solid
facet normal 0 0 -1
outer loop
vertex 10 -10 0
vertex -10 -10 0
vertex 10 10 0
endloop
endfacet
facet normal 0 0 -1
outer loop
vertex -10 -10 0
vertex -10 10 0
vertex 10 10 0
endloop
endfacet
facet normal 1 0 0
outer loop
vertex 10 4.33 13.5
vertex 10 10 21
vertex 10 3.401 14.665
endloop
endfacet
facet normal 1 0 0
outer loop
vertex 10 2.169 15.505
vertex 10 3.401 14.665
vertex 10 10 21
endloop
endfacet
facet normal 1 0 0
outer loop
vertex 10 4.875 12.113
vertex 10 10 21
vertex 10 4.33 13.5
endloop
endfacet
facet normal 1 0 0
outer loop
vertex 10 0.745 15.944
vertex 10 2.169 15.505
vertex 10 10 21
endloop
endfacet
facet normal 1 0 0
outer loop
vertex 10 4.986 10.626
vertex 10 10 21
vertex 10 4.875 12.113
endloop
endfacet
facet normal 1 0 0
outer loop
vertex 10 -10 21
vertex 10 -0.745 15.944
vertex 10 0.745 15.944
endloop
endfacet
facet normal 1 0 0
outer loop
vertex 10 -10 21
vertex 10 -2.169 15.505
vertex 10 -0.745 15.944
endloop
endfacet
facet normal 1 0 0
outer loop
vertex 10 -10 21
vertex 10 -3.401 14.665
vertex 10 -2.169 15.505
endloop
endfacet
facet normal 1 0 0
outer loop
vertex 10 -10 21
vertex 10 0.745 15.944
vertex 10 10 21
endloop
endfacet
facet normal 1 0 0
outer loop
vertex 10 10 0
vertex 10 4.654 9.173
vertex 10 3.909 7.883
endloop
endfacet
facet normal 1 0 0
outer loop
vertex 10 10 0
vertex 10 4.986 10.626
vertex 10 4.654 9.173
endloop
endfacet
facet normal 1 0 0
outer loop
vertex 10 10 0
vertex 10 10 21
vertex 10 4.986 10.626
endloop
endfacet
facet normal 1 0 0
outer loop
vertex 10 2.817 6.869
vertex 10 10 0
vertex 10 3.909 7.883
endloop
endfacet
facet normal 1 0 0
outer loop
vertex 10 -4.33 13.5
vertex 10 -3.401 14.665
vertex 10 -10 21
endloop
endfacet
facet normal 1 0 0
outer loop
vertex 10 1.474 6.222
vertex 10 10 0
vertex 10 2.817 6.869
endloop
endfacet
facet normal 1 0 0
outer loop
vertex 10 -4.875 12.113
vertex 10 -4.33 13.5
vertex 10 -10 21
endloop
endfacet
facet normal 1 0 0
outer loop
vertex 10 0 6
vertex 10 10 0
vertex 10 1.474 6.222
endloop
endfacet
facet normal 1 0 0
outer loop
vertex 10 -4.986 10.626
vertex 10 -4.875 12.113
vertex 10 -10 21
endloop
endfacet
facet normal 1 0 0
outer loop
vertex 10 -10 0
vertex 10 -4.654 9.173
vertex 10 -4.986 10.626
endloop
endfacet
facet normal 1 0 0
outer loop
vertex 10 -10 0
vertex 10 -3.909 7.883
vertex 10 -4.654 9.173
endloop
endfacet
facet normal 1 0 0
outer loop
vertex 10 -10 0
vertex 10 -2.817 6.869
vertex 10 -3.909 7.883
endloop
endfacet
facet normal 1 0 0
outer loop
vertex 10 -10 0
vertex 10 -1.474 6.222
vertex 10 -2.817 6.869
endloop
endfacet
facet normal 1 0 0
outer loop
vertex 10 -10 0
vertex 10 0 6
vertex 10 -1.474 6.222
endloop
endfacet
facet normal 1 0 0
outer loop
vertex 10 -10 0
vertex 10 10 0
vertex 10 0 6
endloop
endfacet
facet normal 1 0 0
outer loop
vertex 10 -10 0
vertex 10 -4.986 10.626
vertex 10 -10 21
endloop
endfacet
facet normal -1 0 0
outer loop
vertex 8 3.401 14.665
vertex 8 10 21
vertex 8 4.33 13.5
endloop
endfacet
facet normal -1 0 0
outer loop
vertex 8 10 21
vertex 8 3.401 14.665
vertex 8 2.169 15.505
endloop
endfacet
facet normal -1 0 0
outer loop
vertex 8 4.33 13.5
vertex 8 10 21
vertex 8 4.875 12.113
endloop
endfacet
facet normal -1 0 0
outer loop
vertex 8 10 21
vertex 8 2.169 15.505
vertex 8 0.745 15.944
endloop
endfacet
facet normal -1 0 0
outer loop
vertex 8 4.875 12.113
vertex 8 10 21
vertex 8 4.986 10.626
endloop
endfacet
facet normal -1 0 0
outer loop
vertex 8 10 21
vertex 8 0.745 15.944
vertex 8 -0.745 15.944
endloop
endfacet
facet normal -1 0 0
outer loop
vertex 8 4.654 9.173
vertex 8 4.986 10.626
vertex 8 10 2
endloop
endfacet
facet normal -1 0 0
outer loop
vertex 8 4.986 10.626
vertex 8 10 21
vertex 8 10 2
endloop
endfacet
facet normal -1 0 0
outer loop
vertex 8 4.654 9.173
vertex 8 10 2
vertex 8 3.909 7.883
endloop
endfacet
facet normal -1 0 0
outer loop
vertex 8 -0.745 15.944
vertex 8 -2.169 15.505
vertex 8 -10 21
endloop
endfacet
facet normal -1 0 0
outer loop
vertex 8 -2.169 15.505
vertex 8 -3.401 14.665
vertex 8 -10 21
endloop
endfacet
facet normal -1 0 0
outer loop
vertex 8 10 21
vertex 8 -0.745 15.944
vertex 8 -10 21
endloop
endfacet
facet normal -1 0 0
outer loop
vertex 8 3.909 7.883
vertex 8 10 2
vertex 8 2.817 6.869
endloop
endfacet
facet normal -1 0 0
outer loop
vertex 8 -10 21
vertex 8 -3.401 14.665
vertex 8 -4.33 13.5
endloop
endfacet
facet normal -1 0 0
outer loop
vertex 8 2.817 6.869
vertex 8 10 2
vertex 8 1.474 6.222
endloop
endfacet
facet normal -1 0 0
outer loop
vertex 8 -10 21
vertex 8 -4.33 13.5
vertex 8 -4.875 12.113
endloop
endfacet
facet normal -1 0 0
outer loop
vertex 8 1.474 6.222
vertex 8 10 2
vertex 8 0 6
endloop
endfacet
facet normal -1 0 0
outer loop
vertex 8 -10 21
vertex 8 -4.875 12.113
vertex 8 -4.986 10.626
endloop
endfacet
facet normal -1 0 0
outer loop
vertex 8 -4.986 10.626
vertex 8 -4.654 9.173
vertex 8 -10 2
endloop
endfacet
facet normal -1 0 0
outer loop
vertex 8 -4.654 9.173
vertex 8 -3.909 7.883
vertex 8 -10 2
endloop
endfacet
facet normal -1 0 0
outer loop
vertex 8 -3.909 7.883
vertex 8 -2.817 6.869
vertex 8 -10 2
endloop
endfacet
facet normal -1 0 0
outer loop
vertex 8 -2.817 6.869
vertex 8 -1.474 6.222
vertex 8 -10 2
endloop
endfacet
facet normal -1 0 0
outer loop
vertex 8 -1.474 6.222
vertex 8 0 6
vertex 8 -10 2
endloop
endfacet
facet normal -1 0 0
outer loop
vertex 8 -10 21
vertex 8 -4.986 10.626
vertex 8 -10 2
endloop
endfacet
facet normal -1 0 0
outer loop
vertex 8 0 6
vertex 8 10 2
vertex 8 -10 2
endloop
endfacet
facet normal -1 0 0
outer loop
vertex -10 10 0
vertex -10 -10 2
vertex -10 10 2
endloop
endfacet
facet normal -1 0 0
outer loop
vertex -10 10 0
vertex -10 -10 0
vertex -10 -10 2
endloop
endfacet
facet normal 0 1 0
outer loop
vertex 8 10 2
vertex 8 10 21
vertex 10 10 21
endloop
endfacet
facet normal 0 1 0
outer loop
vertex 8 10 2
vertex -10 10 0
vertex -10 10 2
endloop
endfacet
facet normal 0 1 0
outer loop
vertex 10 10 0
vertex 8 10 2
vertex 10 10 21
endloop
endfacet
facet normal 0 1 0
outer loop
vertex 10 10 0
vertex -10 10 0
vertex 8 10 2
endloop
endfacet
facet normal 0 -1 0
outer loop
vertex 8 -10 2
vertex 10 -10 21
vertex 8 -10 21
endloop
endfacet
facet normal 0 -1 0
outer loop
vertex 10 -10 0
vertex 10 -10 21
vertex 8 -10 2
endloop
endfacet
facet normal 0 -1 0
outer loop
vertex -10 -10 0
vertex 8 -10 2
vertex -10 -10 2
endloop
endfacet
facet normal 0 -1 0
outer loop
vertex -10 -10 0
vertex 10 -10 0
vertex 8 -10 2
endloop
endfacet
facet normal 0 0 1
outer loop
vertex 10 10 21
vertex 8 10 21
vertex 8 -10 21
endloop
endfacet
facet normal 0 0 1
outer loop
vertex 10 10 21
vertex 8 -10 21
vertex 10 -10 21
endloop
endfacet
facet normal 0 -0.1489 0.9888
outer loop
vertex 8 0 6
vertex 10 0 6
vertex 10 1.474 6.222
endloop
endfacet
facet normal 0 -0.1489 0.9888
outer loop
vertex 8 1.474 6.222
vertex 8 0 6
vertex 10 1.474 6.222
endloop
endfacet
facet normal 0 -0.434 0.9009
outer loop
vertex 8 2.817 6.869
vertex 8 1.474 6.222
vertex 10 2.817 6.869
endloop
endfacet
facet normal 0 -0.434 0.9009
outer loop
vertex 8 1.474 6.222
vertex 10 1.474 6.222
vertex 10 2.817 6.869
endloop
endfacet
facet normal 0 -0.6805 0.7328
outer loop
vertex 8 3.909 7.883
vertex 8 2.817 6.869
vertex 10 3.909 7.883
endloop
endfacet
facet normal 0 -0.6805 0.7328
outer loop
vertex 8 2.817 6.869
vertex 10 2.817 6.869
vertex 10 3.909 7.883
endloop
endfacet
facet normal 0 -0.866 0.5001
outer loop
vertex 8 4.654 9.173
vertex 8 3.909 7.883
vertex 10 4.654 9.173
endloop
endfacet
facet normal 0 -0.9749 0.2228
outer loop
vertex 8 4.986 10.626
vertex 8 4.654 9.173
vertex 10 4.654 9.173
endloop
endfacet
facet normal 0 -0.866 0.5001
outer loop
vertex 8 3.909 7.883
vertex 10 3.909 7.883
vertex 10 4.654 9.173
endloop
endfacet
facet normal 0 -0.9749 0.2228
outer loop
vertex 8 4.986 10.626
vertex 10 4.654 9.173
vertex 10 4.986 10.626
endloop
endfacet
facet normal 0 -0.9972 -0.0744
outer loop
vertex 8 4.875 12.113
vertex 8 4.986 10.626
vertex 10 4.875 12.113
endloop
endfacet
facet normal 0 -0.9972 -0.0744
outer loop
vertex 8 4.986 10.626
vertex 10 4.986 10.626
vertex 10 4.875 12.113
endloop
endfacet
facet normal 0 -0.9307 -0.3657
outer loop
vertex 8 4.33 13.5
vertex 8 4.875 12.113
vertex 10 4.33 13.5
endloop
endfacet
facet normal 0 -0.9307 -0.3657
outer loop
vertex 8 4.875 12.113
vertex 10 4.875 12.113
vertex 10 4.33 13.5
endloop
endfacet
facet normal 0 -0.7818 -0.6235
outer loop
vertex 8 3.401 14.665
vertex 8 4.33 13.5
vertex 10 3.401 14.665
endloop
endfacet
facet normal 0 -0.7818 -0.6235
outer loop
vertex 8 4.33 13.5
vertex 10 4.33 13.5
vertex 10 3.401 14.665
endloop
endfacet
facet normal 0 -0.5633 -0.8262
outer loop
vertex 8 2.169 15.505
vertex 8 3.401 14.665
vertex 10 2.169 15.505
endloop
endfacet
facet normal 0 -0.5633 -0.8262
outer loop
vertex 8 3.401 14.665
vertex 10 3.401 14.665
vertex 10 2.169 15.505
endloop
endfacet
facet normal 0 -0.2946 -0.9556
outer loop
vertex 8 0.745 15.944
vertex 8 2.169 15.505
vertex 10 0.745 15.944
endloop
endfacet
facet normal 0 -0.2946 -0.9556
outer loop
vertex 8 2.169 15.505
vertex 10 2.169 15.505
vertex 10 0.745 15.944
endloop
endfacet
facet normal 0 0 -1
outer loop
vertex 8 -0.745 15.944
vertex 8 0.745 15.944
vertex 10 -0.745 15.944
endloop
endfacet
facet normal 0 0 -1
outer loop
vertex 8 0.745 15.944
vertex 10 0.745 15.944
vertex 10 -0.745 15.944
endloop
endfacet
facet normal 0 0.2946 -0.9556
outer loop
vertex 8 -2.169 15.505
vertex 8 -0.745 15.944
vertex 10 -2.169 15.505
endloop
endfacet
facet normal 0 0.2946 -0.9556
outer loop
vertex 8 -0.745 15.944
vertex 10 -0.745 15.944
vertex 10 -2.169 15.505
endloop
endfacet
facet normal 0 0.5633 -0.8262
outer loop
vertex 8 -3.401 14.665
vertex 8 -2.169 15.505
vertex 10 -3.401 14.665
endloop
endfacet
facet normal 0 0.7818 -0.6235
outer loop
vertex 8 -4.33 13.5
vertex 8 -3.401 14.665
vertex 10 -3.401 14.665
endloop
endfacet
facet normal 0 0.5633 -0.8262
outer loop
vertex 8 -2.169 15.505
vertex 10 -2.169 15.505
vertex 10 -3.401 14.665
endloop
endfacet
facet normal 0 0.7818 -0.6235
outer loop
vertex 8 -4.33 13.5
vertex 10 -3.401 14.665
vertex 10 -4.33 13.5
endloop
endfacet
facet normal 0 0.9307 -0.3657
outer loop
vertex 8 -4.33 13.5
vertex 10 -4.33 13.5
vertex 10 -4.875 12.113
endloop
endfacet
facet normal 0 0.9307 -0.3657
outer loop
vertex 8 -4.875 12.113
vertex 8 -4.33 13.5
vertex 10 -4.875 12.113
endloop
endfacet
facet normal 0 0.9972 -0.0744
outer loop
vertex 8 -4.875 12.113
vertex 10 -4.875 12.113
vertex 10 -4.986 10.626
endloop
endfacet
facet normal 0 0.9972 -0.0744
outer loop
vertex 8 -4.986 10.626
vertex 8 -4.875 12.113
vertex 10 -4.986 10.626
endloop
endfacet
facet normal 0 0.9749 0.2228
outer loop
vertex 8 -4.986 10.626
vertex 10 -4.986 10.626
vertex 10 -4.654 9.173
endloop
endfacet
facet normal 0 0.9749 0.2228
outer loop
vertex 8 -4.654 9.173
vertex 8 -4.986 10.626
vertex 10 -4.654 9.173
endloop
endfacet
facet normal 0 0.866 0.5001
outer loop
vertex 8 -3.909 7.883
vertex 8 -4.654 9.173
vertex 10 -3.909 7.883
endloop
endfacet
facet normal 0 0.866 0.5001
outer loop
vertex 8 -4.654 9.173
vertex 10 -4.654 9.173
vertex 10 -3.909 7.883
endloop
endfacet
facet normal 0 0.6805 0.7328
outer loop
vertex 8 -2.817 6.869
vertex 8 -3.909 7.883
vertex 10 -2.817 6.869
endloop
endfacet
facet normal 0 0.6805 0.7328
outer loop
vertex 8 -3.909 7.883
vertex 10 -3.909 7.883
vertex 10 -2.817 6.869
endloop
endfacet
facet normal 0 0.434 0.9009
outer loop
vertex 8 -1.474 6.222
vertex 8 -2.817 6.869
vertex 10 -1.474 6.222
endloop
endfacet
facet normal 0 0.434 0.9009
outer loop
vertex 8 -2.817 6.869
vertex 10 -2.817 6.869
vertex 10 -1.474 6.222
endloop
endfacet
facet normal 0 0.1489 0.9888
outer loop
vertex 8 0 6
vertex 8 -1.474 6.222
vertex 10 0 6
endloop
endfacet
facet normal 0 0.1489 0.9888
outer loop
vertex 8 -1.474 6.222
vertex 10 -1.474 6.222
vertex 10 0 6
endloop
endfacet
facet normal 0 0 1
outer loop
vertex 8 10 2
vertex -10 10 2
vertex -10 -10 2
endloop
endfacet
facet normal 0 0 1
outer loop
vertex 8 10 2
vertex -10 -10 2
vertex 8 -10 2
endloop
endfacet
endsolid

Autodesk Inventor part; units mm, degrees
ref_plane "YZ Plane" through (0, 0, 0) normal (1, 0, 0) x (0, 1, 0)
ref_plane "XZ Plane" through (0, 0, 0) normal (0, 1, 0) x (-1, 0, 0)
ref_plane "XY Plane" through (0, 0, 0) normal (0, 0, 1) x (1, 0, 0)
sketch "Sketch1" plane through (0, 0, 0) normal (0, 0, 1) x (1, 0, 0)
  line L0 (-10, 10) -> (10, 10)
  line L1 (10, 10) -> (10, -10)
  line L2 (10, -10) -> (-10, -10)
  line L3 (-10, -10) -> (-10, 10)
  line L4 (-10, 10) -> (10, -10) construction
  line L5 (10, 10) -> (-10, -10) construction
  point P0 (0, 0)
  dimension "d0" = 20
  dimension "d1" = 20
extrude "Extrusion1" add sketch "Sketch1" along normal blind 2
sketch "Sketch2" plane through (0, 0, 2) normal (0, 0, 1) x (1, 0, 0)
  line L0 (10, 10) -> (-10, 10) projected
  line L1 (-10, -10) -> (10, -10) projected
  line L2 (10, 10) -> (8, 10)
  line L3 (8, 10) -> (8, -10)
  line L4 (8, -10) -> (10, -10)
  line L5 (10, -10) -> (10, 10)
  point P0 (0, 0)
  dimension "d4" = 2
extrude "Extrusion2" add sketch "Sketch2" along normal blind 19
sketch "Sketch3" plane through (10, -10, 0) normal (1, 0, 0) x (0, 0, -1)
  circle A0 centre (-11, 10) radius 5
  point P0 (0, 10)
  dimension "d7" = 10
extrude "Extrusion3" cut sketch "Sketch3" against normal up to surface (2 mm away)
properties part number "Holder for Main_Shaft"
